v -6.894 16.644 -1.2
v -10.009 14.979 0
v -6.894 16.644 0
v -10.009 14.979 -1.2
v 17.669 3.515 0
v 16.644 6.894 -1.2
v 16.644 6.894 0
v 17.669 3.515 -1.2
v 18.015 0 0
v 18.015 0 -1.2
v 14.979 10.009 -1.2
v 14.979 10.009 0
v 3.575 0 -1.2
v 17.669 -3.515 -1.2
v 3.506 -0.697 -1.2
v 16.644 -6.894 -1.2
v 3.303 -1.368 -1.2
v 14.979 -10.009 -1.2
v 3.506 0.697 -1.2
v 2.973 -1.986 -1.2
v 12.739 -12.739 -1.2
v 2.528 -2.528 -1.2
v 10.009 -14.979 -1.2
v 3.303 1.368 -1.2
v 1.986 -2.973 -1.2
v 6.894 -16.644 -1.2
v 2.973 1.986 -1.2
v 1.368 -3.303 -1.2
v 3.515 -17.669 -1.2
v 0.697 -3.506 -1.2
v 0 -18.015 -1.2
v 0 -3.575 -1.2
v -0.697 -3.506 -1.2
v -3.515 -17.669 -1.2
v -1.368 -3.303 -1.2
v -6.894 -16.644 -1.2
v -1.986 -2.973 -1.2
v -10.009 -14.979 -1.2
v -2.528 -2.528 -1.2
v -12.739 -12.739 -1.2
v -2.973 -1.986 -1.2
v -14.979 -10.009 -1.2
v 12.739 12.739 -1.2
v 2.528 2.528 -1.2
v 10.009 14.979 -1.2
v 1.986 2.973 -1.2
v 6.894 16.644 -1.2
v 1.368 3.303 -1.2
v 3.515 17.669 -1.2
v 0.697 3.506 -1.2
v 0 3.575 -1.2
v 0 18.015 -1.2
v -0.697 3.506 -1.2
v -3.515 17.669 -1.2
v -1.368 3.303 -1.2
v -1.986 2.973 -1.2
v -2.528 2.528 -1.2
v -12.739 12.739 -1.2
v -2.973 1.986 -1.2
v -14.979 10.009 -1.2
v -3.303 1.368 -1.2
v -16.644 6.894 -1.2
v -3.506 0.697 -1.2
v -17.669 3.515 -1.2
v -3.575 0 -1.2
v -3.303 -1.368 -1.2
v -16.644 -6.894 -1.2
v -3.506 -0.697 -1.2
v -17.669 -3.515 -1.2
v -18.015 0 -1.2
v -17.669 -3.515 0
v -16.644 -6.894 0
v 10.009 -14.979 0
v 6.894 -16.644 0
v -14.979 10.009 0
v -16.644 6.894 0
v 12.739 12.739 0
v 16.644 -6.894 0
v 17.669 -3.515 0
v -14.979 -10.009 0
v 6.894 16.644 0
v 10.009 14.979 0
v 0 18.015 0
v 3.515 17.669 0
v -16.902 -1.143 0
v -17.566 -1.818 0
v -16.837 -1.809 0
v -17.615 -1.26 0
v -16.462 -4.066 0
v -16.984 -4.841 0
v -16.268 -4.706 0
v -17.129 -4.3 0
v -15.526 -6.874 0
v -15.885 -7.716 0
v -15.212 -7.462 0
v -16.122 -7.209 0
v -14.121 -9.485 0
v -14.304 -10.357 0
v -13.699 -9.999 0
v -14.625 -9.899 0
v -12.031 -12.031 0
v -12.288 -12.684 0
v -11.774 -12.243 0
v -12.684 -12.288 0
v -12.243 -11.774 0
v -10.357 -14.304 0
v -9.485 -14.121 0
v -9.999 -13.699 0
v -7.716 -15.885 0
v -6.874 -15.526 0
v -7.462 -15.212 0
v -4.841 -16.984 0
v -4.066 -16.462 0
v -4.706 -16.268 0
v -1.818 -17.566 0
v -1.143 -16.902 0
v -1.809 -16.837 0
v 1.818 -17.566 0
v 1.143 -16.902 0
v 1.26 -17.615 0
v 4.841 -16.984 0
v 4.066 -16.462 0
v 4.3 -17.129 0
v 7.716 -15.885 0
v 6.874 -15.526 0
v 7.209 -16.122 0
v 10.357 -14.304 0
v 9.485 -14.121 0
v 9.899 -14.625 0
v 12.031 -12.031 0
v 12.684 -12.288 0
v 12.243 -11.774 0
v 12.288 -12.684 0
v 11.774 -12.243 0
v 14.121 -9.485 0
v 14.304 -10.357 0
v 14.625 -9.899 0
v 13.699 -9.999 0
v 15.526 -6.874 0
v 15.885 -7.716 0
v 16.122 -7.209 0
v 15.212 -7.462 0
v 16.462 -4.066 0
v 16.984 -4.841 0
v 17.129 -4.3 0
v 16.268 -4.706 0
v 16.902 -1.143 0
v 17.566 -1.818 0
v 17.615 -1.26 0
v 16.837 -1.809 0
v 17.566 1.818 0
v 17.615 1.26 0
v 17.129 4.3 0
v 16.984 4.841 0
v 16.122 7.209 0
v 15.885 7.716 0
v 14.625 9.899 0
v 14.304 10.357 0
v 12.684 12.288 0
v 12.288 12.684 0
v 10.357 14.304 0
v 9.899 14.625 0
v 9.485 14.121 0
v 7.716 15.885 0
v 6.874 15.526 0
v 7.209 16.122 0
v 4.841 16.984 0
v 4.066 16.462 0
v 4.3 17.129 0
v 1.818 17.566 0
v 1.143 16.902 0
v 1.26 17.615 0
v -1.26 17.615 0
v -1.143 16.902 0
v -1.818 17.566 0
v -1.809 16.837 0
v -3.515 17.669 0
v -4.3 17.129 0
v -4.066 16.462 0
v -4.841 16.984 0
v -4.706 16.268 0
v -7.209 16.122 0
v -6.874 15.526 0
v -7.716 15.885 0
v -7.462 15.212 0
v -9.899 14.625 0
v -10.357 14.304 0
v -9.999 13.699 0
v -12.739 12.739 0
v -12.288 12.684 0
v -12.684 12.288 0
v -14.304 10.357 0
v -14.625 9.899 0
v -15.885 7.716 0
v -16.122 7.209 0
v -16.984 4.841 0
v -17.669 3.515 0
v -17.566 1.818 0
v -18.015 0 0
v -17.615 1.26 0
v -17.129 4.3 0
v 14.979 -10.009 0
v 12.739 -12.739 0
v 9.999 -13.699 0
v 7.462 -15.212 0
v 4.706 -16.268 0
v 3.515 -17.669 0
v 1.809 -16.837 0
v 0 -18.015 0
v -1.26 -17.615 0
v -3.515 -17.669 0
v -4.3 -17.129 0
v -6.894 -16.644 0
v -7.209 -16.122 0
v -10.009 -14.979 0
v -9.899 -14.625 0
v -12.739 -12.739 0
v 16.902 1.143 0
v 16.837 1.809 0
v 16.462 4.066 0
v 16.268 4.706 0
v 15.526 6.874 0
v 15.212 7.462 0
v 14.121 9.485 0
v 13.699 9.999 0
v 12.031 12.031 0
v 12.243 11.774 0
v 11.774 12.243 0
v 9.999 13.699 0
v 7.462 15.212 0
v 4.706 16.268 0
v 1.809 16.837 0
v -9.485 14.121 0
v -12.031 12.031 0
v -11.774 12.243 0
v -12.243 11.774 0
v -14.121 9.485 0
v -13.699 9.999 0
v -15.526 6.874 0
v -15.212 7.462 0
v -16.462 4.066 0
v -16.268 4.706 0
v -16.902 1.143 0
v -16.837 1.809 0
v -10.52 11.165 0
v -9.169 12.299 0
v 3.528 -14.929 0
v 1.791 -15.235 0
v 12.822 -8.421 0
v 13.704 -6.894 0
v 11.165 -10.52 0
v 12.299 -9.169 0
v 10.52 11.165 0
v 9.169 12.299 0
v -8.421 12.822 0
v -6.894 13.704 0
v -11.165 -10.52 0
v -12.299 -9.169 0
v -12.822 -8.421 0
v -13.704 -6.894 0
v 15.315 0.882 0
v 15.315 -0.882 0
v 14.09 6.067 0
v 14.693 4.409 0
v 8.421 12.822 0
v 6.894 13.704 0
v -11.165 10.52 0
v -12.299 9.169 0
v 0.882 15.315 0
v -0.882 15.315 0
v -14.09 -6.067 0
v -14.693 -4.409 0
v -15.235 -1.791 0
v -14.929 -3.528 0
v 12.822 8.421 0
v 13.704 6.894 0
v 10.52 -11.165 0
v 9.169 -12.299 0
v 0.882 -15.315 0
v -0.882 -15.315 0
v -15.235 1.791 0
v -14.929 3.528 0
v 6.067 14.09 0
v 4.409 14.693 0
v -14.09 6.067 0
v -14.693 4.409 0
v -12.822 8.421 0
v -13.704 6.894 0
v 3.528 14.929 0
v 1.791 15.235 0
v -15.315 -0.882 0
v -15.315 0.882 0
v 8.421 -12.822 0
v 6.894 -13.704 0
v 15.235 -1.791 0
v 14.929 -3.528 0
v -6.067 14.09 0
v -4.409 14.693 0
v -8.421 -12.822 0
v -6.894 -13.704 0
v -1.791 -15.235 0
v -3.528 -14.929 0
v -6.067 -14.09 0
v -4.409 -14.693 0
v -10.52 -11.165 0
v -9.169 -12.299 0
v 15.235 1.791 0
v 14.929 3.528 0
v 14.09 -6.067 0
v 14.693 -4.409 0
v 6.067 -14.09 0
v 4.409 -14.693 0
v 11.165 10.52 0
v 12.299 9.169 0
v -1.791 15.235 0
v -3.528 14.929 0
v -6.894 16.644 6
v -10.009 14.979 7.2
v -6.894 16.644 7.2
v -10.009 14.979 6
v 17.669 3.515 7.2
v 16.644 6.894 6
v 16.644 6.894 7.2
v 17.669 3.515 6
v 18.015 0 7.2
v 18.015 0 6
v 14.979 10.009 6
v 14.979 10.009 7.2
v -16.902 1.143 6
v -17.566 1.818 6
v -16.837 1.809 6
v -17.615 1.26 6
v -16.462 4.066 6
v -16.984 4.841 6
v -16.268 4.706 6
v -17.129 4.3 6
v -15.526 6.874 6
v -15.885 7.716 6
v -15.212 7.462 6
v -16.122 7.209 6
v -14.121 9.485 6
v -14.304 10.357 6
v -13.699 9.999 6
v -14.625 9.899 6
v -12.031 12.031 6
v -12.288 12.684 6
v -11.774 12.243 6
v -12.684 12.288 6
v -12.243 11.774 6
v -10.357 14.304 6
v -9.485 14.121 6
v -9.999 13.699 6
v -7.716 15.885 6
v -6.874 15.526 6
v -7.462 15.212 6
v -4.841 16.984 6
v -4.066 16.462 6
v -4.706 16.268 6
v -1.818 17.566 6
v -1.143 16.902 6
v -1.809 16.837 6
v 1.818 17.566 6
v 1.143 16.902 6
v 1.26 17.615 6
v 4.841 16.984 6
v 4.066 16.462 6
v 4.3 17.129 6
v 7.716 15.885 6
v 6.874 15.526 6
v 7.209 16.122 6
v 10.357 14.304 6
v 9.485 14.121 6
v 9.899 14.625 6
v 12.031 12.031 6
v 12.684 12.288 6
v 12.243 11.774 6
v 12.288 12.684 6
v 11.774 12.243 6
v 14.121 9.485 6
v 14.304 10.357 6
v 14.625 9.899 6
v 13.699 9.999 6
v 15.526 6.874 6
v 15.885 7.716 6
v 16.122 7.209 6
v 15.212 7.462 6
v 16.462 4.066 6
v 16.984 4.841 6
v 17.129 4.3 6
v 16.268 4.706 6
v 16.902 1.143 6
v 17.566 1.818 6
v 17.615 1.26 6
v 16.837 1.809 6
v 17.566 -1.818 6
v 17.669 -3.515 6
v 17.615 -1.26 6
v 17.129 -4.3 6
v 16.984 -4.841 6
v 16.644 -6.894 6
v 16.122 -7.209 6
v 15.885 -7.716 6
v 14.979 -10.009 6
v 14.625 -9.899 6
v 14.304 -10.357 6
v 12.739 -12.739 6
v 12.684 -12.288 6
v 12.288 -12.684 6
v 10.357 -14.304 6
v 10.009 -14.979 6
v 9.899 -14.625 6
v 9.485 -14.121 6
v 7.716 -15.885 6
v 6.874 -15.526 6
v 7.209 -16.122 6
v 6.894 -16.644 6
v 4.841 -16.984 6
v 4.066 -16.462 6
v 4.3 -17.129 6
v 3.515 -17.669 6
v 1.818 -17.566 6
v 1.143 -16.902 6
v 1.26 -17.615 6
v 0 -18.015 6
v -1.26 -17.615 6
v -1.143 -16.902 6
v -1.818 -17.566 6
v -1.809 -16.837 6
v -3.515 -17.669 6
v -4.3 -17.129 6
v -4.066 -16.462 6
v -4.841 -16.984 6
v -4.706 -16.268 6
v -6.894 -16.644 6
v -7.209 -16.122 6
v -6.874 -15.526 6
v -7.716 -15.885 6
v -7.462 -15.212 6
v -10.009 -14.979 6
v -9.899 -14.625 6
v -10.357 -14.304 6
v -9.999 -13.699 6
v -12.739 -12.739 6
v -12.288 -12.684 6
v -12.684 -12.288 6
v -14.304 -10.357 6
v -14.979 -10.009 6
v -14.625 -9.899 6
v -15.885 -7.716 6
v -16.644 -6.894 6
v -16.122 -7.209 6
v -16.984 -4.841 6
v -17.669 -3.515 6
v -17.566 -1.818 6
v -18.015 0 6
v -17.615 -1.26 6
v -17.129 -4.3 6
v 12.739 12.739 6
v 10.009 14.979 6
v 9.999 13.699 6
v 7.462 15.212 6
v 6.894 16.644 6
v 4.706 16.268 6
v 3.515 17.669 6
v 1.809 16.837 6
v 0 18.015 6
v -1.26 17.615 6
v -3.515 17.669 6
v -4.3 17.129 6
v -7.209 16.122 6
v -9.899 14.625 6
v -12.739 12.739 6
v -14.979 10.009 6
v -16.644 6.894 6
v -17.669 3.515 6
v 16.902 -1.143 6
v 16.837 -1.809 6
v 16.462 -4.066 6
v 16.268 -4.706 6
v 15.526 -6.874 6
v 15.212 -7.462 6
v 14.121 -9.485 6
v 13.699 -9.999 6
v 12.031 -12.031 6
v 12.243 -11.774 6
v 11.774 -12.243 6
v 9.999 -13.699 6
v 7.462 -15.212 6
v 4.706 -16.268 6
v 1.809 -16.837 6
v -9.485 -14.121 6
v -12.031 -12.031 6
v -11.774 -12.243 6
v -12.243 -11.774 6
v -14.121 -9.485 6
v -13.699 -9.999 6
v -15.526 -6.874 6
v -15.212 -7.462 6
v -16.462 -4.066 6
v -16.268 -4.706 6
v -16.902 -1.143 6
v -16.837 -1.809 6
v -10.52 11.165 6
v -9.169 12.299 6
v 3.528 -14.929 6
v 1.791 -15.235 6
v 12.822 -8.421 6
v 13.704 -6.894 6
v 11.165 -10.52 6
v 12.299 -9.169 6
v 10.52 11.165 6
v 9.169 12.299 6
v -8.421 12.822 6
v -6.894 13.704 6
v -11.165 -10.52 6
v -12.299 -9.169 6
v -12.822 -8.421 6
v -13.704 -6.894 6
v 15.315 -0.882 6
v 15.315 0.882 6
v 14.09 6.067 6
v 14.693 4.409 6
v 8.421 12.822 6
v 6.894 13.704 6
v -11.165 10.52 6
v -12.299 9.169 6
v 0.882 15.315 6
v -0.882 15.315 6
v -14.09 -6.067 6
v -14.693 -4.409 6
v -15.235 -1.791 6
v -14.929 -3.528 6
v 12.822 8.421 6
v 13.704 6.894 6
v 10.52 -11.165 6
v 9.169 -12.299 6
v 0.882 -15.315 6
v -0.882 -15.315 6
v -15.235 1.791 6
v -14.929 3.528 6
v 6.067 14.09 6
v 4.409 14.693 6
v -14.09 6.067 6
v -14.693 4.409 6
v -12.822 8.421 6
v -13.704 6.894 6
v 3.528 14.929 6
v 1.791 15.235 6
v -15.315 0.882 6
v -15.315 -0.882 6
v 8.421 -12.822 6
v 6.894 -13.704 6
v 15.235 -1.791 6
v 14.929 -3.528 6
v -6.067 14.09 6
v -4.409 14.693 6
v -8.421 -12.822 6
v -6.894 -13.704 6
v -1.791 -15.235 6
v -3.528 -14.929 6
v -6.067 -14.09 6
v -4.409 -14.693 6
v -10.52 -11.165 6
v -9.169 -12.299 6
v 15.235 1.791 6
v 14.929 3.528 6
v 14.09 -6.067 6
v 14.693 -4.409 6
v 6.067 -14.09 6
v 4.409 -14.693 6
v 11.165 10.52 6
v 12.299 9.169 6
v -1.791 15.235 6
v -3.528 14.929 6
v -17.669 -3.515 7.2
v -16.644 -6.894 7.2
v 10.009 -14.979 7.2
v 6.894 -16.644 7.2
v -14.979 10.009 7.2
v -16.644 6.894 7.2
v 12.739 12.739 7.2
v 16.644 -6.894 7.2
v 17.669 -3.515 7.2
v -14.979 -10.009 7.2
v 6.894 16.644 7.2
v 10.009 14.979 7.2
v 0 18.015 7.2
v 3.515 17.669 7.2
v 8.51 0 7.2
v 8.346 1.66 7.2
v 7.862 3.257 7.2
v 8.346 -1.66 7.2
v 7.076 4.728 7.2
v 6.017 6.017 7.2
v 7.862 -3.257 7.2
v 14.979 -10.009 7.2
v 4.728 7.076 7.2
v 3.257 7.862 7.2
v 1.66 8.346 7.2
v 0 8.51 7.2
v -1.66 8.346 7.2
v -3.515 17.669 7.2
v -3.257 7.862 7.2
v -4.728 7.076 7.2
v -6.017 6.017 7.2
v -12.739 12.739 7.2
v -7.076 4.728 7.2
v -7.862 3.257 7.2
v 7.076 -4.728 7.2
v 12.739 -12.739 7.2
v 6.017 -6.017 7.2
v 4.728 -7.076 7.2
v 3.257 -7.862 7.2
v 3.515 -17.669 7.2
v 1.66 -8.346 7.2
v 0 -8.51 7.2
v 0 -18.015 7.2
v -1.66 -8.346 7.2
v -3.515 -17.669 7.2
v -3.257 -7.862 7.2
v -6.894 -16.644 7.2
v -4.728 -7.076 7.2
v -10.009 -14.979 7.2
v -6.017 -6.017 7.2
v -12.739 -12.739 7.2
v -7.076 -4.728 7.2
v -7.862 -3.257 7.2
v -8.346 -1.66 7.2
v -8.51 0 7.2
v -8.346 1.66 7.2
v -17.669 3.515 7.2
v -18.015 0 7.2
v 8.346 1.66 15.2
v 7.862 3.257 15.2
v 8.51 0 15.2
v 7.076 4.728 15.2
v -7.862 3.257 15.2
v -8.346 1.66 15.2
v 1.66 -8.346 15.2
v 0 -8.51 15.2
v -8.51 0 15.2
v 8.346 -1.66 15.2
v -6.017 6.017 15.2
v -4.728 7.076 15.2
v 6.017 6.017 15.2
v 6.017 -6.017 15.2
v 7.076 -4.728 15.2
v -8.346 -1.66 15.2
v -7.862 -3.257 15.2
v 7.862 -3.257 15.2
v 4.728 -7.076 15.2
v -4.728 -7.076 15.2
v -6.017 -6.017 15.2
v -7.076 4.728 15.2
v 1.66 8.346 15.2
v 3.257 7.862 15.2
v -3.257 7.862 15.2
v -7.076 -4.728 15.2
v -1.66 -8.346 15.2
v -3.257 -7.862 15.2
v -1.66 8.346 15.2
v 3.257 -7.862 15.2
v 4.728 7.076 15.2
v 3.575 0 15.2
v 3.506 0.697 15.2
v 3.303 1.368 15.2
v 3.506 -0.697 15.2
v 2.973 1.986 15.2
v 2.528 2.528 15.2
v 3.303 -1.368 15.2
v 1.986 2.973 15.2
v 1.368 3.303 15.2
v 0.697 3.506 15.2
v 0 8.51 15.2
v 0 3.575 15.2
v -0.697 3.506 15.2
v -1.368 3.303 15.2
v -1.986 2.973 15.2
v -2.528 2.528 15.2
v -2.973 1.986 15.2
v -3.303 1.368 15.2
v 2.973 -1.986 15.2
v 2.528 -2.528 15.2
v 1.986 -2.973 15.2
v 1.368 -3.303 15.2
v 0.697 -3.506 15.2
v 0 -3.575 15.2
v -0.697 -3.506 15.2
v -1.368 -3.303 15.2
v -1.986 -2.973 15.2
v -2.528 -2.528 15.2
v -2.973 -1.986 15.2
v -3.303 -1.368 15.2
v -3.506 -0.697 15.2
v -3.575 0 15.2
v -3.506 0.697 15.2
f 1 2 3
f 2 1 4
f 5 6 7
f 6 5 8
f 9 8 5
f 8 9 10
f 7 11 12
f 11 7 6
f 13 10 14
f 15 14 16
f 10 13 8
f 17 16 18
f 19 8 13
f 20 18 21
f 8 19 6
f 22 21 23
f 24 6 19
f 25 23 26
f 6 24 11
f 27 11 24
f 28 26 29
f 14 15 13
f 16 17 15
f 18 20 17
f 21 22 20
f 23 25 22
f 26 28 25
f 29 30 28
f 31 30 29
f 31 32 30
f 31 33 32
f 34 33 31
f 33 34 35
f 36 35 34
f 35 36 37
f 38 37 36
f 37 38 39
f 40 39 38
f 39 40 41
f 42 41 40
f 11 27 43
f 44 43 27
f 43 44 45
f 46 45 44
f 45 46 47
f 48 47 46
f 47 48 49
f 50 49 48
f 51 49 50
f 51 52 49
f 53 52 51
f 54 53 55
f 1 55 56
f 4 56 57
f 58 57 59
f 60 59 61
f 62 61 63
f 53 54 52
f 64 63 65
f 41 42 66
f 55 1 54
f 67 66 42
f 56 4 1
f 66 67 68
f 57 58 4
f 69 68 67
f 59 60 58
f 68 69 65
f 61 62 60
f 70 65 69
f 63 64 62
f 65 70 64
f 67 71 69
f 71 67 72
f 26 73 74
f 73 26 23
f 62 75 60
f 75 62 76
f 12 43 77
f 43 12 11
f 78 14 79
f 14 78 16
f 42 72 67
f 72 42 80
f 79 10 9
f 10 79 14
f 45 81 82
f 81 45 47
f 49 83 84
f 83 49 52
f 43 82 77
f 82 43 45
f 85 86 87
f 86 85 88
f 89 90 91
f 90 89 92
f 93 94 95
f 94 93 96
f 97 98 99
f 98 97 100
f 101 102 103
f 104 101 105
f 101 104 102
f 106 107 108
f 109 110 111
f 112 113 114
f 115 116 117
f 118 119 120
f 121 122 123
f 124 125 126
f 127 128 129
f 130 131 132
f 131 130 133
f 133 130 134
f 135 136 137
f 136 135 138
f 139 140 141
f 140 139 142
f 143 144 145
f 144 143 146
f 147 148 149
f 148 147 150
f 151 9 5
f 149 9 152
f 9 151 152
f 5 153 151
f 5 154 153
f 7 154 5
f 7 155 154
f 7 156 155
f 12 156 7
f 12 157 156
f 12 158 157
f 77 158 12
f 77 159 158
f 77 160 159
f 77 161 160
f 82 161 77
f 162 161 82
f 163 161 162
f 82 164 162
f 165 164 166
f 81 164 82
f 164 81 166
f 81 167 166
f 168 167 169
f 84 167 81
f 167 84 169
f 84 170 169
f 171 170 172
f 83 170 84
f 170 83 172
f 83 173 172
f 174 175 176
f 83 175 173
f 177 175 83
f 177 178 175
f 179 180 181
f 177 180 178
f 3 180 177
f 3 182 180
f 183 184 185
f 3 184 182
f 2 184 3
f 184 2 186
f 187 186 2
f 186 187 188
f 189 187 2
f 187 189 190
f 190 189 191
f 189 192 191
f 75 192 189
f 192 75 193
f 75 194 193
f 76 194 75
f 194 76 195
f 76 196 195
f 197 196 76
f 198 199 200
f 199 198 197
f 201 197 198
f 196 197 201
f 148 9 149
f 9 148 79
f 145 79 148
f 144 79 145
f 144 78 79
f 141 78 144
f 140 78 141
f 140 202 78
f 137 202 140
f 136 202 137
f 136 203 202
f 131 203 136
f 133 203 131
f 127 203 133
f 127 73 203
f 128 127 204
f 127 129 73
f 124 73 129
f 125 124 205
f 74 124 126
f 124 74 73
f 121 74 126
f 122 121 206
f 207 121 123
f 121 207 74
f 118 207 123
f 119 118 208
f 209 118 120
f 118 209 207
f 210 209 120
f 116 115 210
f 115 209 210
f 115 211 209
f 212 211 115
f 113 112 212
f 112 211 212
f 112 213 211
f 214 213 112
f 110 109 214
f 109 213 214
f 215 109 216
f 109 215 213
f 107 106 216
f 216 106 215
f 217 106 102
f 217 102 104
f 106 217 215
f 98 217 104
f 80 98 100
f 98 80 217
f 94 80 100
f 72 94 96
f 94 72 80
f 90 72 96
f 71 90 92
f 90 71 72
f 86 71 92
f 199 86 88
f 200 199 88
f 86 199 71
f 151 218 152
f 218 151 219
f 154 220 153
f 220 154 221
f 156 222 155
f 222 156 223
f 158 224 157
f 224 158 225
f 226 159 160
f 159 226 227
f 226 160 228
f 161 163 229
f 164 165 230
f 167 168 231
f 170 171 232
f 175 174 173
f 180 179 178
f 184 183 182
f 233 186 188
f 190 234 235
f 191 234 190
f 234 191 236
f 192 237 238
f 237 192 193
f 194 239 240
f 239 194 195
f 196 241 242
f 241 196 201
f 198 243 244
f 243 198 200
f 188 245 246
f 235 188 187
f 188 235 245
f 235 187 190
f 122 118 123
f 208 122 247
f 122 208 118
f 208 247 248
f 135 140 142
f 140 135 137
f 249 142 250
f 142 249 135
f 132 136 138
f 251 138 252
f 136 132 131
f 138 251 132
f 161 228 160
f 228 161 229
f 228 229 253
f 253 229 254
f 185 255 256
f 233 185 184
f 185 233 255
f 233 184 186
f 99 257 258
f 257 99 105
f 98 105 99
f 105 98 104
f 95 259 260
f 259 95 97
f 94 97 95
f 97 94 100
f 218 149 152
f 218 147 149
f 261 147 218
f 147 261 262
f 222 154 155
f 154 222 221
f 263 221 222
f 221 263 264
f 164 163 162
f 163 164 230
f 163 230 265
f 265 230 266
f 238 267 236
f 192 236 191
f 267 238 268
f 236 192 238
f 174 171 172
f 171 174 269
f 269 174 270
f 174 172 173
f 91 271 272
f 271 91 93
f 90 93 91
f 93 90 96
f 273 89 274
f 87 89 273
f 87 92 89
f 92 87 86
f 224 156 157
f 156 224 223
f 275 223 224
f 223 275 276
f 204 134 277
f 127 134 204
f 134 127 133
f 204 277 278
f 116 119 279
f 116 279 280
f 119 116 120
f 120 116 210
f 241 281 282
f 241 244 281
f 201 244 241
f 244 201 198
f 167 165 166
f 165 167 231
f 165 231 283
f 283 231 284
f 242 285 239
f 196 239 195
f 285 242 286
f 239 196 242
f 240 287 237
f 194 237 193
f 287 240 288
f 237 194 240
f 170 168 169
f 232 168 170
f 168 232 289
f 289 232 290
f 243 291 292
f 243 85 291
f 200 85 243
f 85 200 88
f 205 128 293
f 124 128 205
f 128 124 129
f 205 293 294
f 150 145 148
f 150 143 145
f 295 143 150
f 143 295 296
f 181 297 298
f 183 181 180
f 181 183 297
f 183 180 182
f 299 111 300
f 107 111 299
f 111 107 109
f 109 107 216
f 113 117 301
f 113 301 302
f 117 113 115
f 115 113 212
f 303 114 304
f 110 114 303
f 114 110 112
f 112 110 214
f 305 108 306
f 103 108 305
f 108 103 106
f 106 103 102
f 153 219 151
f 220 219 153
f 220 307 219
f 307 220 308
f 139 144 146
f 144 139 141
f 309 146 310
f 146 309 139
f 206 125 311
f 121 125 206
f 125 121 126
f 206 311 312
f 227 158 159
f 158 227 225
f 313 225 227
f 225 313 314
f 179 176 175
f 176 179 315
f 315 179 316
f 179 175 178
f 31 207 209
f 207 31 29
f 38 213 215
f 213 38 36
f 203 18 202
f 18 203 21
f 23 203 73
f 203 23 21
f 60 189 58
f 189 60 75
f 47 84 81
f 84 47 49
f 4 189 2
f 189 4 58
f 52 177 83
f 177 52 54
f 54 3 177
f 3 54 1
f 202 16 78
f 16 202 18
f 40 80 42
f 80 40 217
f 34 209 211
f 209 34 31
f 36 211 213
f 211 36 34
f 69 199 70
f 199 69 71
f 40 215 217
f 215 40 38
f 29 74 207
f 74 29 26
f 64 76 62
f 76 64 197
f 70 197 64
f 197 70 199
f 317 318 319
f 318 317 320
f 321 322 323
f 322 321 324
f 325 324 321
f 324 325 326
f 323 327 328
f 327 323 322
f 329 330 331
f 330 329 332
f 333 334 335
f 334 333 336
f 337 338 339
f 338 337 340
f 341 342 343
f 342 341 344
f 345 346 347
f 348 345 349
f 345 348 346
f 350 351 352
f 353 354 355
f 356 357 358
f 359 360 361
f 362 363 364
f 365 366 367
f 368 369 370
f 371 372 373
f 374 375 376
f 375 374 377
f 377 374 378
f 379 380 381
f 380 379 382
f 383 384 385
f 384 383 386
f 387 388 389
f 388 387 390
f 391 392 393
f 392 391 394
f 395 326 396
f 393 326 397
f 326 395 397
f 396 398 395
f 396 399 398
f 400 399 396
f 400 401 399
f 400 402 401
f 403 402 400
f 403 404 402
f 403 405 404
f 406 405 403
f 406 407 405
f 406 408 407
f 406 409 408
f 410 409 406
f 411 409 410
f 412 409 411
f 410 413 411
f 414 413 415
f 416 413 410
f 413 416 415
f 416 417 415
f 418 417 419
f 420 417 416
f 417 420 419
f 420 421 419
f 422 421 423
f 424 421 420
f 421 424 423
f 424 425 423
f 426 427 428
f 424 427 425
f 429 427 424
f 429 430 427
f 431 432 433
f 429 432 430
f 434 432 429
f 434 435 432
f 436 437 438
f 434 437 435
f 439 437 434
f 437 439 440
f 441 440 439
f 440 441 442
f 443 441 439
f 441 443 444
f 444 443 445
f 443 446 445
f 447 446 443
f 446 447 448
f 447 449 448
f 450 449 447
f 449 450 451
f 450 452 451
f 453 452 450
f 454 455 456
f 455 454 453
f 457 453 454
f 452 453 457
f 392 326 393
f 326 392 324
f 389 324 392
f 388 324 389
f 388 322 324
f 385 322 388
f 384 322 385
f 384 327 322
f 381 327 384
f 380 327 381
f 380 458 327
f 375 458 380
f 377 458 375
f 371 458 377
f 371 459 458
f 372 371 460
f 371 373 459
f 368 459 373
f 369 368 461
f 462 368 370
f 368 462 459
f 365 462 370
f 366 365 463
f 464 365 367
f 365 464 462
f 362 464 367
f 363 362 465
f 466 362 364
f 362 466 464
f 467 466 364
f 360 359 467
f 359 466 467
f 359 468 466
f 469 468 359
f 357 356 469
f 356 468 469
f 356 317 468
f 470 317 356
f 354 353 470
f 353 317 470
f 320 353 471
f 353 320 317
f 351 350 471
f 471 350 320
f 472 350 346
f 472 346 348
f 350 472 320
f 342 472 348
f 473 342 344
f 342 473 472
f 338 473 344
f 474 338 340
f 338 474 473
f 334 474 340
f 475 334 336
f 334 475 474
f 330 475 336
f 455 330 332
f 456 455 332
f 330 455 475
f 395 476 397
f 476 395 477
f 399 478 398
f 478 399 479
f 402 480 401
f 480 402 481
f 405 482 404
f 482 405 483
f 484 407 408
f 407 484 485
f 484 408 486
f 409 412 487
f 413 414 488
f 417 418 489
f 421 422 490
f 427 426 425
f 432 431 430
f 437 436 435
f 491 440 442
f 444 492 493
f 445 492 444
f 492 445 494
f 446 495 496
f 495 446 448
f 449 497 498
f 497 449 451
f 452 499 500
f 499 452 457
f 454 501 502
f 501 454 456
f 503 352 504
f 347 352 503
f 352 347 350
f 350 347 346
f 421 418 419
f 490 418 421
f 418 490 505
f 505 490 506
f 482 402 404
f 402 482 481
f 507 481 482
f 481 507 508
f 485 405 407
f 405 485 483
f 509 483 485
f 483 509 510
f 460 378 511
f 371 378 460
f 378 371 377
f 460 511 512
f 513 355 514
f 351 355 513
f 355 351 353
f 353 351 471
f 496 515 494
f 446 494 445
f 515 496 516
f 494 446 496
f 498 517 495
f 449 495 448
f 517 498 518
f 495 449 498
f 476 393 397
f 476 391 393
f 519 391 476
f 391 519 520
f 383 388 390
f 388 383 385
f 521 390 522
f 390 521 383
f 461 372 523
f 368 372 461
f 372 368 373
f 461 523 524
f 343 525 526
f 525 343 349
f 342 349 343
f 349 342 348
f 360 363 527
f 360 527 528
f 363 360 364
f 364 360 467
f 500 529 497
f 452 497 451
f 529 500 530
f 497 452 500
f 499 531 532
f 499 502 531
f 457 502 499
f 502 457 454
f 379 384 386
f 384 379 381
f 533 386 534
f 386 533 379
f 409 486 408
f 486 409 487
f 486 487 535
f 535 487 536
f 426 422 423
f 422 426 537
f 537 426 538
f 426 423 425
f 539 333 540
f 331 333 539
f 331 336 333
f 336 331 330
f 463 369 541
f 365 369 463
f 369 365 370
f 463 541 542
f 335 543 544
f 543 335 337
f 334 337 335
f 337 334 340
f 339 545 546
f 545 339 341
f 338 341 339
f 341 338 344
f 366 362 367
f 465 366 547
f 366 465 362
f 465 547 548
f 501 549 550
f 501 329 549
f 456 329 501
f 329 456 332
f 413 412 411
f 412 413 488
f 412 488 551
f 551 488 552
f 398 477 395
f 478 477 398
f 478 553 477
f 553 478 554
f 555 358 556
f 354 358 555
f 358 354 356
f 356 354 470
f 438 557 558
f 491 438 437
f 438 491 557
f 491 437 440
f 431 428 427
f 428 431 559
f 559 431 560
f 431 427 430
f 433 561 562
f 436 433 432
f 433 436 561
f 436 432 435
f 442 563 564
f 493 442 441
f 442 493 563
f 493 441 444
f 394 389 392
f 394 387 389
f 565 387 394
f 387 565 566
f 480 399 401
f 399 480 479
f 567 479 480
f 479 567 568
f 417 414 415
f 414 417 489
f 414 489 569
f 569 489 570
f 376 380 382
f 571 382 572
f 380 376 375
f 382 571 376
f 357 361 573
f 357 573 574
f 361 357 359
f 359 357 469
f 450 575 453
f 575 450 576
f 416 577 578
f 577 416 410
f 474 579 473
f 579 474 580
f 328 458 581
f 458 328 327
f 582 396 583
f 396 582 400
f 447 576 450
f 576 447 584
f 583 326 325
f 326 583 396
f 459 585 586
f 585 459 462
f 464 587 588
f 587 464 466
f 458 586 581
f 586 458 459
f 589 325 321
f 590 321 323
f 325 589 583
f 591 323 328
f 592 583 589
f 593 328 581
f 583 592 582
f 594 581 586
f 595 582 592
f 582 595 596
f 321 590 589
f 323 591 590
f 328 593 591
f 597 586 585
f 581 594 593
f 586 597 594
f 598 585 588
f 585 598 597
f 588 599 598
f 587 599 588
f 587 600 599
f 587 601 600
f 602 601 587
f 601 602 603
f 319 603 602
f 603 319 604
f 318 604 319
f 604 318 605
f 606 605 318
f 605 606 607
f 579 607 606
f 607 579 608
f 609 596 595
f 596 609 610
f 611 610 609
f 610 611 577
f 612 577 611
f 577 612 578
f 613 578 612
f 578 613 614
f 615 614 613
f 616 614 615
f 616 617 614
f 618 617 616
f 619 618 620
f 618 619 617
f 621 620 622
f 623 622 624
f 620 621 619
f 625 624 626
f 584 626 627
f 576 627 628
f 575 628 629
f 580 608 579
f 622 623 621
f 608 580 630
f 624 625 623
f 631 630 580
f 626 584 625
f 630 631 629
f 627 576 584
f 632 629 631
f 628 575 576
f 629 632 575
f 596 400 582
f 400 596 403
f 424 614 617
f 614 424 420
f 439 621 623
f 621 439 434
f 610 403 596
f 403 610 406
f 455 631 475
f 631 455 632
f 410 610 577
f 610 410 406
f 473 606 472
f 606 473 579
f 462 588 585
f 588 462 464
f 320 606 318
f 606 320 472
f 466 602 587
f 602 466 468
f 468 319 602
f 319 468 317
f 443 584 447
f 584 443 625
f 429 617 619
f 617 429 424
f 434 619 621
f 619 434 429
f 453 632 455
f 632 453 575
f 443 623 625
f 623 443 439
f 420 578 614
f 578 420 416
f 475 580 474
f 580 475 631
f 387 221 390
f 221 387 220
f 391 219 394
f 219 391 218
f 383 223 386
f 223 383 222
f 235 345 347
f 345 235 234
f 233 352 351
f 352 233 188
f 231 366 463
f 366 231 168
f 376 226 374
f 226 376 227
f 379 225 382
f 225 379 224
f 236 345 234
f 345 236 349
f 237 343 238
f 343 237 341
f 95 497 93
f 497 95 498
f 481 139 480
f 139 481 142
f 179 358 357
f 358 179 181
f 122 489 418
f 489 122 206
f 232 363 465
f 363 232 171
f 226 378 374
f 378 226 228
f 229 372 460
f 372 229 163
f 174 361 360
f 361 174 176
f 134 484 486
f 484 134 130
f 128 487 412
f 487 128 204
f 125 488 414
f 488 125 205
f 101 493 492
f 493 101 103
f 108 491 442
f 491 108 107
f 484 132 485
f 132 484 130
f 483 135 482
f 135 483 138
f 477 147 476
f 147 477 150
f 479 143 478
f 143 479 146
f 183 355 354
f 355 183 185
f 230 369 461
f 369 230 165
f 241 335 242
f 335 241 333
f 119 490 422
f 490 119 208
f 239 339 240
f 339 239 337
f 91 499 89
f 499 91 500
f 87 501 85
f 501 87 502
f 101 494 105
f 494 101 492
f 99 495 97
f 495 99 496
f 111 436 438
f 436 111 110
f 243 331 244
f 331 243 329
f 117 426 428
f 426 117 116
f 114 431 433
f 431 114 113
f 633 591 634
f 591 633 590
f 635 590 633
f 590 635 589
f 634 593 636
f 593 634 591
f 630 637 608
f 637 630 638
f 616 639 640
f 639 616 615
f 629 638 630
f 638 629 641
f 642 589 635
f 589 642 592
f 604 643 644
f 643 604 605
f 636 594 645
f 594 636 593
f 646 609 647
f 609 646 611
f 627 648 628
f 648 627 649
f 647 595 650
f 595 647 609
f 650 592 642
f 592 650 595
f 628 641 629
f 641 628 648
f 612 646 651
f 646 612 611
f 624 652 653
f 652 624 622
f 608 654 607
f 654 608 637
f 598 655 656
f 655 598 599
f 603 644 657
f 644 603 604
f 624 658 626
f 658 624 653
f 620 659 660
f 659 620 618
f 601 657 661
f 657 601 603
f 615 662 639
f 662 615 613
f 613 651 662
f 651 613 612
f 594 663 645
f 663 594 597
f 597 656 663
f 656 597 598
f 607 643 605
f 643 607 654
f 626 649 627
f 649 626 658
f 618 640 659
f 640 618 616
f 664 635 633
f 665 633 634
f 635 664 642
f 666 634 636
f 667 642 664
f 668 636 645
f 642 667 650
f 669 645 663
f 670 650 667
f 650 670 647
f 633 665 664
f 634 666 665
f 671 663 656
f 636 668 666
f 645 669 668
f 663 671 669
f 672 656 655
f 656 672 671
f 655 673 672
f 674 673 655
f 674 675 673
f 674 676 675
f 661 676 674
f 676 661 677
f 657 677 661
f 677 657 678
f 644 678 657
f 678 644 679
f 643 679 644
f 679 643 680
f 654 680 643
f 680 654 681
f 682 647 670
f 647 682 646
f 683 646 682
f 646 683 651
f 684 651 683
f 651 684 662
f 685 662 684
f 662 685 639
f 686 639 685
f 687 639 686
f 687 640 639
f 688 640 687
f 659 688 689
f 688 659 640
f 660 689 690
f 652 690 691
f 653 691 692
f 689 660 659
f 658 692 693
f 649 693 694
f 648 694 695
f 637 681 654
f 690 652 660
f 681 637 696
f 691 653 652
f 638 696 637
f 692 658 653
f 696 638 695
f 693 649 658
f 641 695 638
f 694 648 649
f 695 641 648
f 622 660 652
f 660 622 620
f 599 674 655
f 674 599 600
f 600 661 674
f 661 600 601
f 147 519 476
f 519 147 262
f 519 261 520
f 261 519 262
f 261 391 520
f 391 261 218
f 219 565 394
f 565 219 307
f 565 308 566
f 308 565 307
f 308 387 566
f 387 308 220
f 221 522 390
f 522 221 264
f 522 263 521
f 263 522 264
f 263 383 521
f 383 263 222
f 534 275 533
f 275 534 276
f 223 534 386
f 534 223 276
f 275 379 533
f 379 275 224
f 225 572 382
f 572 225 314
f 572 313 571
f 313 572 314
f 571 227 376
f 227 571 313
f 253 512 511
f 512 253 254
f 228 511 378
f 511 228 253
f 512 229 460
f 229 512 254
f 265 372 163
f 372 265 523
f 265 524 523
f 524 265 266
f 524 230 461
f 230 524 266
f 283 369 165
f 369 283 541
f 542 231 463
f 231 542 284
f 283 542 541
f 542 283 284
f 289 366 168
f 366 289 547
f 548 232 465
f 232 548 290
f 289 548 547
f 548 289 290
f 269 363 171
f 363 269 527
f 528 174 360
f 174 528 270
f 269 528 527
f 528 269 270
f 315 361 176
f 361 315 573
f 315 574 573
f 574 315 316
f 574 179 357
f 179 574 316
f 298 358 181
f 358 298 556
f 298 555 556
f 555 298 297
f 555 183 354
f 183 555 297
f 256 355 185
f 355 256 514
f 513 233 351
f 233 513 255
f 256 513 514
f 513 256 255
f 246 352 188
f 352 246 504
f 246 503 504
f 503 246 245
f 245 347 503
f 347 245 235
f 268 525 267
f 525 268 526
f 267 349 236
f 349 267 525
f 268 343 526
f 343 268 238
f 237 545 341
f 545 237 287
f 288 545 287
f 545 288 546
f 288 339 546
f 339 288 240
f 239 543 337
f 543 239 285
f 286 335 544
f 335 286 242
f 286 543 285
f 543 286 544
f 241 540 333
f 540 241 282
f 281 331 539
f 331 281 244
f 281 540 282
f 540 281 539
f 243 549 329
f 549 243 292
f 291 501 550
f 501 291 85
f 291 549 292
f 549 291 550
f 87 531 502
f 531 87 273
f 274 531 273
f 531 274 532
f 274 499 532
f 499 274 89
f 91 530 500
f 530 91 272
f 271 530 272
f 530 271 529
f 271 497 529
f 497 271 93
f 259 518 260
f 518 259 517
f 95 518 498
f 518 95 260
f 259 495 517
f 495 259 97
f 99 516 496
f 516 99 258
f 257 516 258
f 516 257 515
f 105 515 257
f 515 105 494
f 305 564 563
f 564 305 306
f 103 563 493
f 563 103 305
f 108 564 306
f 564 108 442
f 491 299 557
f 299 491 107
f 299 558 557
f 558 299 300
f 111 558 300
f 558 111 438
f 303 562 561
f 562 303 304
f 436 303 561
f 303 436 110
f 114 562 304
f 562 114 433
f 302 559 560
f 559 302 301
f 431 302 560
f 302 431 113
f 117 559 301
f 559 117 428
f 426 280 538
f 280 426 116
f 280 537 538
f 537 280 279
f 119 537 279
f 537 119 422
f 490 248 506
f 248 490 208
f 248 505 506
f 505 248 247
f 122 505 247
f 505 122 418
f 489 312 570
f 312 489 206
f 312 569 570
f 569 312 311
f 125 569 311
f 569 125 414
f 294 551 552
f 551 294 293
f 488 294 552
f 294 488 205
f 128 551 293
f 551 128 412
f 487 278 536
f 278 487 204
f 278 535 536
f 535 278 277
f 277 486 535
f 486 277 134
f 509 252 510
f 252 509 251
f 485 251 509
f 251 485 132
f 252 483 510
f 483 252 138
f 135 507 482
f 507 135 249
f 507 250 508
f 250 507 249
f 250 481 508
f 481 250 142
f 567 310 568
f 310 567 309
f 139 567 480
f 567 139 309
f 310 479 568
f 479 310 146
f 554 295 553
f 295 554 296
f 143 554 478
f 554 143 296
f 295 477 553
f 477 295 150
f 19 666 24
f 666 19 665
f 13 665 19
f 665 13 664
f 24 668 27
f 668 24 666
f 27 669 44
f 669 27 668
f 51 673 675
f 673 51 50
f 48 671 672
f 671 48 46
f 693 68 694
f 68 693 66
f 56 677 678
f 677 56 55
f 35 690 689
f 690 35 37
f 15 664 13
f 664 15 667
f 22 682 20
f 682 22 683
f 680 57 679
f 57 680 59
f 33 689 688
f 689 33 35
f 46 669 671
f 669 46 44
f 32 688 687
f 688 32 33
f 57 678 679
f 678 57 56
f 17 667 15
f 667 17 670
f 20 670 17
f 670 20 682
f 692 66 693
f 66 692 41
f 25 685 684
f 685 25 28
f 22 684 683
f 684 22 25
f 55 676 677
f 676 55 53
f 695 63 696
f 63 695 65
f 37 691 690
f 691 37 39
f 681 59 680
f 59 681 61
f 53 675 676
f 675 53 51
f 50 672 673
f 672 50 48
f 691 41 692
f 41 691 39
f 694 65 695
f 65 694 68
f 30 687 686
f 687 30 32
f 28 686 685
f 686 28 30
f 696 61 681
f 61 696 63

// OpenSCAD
$fn = 32;

// ----------------------------------------------------------------------
// Timing pulley: GT3 36T, pitch 3 mm, 36.03 mm x 16.4 mm
// ----------------------------------------------------------------------

// --- parameters (mm) ---
belt_pitch = 3;           // belt pitch
n_teeth = 36;             // number of grooves
rim_w = 6;                // belt width between the flanges
tip_d = 34.03;            // tip circle diameter
root_d = 31.83;           // groove bottom diameter
groove_h = 1.1;           // groove depth
tooth_w = 2.1;            // groove width at the tip circle
rim_d = 36.03;            // flange diameter
rim_t = 1.2;              // flange thickness
spigot_d = 30.23;         // flange spigot, sunk into the rim
spigot_h = 1.2;           // spigot depth into the rim
shaft_d = 7.15;           // shaft bore
hub_d = 17.02;            // hub diameter
hub_h = 8;                // hub above the flange
bottom_z = -1.2;          // lowest point of the pulley
top_z = 15.2;             // highest point of the pulley

module rim() {
  cylinder(h = rim_w, d = tip_d);
}

module groove_cutter() {
  /* belt tooth groove: deeper than wide, cut through the belt width */
  translate([root_d / 2, 0, 0])
    linear_extrude(height = rim_w)
      polygon(points = [[-0.6, -tooth_w * 0.42], [groove_h + 0.6, -tooth_w * 0.6],
                        [groove_h + 0.6, tooth_w * 0.6], [-0.6, tooth_w * 0.42]]);
}

module flanges() {
  translate([0, 0, -rim_t]) cylinder(h = rim_t, d = rim_d);
  translate([0, 0, rim_w]) cylinder(h = rim_t, d = rim_d);
  translate([0, 0, -spigot_h]) cylinder(h = spigot_h + 0.6, d = spigot_d);
  translate([0, 0, rim_w - 0.6]) cylinder(h = spigot_h + 0.6, d = spigot_d);
}

module hub() {
  translate([0, 0, bottom_z]) cylinder(h = top_z - bottom_z, d = hub_d);
}

difference() {
  union() {
    rim();
    hub();
    flanges();
  }
  for (i = [0 : n_teeth - 1]) rotate([0, 0, i * 360 / n_teeth]) groove_cutter();
  translate([0, 0, bottom_z - 1]) cylinder(h = top_z - bottom_z + 2, d = shaft_d);
}
